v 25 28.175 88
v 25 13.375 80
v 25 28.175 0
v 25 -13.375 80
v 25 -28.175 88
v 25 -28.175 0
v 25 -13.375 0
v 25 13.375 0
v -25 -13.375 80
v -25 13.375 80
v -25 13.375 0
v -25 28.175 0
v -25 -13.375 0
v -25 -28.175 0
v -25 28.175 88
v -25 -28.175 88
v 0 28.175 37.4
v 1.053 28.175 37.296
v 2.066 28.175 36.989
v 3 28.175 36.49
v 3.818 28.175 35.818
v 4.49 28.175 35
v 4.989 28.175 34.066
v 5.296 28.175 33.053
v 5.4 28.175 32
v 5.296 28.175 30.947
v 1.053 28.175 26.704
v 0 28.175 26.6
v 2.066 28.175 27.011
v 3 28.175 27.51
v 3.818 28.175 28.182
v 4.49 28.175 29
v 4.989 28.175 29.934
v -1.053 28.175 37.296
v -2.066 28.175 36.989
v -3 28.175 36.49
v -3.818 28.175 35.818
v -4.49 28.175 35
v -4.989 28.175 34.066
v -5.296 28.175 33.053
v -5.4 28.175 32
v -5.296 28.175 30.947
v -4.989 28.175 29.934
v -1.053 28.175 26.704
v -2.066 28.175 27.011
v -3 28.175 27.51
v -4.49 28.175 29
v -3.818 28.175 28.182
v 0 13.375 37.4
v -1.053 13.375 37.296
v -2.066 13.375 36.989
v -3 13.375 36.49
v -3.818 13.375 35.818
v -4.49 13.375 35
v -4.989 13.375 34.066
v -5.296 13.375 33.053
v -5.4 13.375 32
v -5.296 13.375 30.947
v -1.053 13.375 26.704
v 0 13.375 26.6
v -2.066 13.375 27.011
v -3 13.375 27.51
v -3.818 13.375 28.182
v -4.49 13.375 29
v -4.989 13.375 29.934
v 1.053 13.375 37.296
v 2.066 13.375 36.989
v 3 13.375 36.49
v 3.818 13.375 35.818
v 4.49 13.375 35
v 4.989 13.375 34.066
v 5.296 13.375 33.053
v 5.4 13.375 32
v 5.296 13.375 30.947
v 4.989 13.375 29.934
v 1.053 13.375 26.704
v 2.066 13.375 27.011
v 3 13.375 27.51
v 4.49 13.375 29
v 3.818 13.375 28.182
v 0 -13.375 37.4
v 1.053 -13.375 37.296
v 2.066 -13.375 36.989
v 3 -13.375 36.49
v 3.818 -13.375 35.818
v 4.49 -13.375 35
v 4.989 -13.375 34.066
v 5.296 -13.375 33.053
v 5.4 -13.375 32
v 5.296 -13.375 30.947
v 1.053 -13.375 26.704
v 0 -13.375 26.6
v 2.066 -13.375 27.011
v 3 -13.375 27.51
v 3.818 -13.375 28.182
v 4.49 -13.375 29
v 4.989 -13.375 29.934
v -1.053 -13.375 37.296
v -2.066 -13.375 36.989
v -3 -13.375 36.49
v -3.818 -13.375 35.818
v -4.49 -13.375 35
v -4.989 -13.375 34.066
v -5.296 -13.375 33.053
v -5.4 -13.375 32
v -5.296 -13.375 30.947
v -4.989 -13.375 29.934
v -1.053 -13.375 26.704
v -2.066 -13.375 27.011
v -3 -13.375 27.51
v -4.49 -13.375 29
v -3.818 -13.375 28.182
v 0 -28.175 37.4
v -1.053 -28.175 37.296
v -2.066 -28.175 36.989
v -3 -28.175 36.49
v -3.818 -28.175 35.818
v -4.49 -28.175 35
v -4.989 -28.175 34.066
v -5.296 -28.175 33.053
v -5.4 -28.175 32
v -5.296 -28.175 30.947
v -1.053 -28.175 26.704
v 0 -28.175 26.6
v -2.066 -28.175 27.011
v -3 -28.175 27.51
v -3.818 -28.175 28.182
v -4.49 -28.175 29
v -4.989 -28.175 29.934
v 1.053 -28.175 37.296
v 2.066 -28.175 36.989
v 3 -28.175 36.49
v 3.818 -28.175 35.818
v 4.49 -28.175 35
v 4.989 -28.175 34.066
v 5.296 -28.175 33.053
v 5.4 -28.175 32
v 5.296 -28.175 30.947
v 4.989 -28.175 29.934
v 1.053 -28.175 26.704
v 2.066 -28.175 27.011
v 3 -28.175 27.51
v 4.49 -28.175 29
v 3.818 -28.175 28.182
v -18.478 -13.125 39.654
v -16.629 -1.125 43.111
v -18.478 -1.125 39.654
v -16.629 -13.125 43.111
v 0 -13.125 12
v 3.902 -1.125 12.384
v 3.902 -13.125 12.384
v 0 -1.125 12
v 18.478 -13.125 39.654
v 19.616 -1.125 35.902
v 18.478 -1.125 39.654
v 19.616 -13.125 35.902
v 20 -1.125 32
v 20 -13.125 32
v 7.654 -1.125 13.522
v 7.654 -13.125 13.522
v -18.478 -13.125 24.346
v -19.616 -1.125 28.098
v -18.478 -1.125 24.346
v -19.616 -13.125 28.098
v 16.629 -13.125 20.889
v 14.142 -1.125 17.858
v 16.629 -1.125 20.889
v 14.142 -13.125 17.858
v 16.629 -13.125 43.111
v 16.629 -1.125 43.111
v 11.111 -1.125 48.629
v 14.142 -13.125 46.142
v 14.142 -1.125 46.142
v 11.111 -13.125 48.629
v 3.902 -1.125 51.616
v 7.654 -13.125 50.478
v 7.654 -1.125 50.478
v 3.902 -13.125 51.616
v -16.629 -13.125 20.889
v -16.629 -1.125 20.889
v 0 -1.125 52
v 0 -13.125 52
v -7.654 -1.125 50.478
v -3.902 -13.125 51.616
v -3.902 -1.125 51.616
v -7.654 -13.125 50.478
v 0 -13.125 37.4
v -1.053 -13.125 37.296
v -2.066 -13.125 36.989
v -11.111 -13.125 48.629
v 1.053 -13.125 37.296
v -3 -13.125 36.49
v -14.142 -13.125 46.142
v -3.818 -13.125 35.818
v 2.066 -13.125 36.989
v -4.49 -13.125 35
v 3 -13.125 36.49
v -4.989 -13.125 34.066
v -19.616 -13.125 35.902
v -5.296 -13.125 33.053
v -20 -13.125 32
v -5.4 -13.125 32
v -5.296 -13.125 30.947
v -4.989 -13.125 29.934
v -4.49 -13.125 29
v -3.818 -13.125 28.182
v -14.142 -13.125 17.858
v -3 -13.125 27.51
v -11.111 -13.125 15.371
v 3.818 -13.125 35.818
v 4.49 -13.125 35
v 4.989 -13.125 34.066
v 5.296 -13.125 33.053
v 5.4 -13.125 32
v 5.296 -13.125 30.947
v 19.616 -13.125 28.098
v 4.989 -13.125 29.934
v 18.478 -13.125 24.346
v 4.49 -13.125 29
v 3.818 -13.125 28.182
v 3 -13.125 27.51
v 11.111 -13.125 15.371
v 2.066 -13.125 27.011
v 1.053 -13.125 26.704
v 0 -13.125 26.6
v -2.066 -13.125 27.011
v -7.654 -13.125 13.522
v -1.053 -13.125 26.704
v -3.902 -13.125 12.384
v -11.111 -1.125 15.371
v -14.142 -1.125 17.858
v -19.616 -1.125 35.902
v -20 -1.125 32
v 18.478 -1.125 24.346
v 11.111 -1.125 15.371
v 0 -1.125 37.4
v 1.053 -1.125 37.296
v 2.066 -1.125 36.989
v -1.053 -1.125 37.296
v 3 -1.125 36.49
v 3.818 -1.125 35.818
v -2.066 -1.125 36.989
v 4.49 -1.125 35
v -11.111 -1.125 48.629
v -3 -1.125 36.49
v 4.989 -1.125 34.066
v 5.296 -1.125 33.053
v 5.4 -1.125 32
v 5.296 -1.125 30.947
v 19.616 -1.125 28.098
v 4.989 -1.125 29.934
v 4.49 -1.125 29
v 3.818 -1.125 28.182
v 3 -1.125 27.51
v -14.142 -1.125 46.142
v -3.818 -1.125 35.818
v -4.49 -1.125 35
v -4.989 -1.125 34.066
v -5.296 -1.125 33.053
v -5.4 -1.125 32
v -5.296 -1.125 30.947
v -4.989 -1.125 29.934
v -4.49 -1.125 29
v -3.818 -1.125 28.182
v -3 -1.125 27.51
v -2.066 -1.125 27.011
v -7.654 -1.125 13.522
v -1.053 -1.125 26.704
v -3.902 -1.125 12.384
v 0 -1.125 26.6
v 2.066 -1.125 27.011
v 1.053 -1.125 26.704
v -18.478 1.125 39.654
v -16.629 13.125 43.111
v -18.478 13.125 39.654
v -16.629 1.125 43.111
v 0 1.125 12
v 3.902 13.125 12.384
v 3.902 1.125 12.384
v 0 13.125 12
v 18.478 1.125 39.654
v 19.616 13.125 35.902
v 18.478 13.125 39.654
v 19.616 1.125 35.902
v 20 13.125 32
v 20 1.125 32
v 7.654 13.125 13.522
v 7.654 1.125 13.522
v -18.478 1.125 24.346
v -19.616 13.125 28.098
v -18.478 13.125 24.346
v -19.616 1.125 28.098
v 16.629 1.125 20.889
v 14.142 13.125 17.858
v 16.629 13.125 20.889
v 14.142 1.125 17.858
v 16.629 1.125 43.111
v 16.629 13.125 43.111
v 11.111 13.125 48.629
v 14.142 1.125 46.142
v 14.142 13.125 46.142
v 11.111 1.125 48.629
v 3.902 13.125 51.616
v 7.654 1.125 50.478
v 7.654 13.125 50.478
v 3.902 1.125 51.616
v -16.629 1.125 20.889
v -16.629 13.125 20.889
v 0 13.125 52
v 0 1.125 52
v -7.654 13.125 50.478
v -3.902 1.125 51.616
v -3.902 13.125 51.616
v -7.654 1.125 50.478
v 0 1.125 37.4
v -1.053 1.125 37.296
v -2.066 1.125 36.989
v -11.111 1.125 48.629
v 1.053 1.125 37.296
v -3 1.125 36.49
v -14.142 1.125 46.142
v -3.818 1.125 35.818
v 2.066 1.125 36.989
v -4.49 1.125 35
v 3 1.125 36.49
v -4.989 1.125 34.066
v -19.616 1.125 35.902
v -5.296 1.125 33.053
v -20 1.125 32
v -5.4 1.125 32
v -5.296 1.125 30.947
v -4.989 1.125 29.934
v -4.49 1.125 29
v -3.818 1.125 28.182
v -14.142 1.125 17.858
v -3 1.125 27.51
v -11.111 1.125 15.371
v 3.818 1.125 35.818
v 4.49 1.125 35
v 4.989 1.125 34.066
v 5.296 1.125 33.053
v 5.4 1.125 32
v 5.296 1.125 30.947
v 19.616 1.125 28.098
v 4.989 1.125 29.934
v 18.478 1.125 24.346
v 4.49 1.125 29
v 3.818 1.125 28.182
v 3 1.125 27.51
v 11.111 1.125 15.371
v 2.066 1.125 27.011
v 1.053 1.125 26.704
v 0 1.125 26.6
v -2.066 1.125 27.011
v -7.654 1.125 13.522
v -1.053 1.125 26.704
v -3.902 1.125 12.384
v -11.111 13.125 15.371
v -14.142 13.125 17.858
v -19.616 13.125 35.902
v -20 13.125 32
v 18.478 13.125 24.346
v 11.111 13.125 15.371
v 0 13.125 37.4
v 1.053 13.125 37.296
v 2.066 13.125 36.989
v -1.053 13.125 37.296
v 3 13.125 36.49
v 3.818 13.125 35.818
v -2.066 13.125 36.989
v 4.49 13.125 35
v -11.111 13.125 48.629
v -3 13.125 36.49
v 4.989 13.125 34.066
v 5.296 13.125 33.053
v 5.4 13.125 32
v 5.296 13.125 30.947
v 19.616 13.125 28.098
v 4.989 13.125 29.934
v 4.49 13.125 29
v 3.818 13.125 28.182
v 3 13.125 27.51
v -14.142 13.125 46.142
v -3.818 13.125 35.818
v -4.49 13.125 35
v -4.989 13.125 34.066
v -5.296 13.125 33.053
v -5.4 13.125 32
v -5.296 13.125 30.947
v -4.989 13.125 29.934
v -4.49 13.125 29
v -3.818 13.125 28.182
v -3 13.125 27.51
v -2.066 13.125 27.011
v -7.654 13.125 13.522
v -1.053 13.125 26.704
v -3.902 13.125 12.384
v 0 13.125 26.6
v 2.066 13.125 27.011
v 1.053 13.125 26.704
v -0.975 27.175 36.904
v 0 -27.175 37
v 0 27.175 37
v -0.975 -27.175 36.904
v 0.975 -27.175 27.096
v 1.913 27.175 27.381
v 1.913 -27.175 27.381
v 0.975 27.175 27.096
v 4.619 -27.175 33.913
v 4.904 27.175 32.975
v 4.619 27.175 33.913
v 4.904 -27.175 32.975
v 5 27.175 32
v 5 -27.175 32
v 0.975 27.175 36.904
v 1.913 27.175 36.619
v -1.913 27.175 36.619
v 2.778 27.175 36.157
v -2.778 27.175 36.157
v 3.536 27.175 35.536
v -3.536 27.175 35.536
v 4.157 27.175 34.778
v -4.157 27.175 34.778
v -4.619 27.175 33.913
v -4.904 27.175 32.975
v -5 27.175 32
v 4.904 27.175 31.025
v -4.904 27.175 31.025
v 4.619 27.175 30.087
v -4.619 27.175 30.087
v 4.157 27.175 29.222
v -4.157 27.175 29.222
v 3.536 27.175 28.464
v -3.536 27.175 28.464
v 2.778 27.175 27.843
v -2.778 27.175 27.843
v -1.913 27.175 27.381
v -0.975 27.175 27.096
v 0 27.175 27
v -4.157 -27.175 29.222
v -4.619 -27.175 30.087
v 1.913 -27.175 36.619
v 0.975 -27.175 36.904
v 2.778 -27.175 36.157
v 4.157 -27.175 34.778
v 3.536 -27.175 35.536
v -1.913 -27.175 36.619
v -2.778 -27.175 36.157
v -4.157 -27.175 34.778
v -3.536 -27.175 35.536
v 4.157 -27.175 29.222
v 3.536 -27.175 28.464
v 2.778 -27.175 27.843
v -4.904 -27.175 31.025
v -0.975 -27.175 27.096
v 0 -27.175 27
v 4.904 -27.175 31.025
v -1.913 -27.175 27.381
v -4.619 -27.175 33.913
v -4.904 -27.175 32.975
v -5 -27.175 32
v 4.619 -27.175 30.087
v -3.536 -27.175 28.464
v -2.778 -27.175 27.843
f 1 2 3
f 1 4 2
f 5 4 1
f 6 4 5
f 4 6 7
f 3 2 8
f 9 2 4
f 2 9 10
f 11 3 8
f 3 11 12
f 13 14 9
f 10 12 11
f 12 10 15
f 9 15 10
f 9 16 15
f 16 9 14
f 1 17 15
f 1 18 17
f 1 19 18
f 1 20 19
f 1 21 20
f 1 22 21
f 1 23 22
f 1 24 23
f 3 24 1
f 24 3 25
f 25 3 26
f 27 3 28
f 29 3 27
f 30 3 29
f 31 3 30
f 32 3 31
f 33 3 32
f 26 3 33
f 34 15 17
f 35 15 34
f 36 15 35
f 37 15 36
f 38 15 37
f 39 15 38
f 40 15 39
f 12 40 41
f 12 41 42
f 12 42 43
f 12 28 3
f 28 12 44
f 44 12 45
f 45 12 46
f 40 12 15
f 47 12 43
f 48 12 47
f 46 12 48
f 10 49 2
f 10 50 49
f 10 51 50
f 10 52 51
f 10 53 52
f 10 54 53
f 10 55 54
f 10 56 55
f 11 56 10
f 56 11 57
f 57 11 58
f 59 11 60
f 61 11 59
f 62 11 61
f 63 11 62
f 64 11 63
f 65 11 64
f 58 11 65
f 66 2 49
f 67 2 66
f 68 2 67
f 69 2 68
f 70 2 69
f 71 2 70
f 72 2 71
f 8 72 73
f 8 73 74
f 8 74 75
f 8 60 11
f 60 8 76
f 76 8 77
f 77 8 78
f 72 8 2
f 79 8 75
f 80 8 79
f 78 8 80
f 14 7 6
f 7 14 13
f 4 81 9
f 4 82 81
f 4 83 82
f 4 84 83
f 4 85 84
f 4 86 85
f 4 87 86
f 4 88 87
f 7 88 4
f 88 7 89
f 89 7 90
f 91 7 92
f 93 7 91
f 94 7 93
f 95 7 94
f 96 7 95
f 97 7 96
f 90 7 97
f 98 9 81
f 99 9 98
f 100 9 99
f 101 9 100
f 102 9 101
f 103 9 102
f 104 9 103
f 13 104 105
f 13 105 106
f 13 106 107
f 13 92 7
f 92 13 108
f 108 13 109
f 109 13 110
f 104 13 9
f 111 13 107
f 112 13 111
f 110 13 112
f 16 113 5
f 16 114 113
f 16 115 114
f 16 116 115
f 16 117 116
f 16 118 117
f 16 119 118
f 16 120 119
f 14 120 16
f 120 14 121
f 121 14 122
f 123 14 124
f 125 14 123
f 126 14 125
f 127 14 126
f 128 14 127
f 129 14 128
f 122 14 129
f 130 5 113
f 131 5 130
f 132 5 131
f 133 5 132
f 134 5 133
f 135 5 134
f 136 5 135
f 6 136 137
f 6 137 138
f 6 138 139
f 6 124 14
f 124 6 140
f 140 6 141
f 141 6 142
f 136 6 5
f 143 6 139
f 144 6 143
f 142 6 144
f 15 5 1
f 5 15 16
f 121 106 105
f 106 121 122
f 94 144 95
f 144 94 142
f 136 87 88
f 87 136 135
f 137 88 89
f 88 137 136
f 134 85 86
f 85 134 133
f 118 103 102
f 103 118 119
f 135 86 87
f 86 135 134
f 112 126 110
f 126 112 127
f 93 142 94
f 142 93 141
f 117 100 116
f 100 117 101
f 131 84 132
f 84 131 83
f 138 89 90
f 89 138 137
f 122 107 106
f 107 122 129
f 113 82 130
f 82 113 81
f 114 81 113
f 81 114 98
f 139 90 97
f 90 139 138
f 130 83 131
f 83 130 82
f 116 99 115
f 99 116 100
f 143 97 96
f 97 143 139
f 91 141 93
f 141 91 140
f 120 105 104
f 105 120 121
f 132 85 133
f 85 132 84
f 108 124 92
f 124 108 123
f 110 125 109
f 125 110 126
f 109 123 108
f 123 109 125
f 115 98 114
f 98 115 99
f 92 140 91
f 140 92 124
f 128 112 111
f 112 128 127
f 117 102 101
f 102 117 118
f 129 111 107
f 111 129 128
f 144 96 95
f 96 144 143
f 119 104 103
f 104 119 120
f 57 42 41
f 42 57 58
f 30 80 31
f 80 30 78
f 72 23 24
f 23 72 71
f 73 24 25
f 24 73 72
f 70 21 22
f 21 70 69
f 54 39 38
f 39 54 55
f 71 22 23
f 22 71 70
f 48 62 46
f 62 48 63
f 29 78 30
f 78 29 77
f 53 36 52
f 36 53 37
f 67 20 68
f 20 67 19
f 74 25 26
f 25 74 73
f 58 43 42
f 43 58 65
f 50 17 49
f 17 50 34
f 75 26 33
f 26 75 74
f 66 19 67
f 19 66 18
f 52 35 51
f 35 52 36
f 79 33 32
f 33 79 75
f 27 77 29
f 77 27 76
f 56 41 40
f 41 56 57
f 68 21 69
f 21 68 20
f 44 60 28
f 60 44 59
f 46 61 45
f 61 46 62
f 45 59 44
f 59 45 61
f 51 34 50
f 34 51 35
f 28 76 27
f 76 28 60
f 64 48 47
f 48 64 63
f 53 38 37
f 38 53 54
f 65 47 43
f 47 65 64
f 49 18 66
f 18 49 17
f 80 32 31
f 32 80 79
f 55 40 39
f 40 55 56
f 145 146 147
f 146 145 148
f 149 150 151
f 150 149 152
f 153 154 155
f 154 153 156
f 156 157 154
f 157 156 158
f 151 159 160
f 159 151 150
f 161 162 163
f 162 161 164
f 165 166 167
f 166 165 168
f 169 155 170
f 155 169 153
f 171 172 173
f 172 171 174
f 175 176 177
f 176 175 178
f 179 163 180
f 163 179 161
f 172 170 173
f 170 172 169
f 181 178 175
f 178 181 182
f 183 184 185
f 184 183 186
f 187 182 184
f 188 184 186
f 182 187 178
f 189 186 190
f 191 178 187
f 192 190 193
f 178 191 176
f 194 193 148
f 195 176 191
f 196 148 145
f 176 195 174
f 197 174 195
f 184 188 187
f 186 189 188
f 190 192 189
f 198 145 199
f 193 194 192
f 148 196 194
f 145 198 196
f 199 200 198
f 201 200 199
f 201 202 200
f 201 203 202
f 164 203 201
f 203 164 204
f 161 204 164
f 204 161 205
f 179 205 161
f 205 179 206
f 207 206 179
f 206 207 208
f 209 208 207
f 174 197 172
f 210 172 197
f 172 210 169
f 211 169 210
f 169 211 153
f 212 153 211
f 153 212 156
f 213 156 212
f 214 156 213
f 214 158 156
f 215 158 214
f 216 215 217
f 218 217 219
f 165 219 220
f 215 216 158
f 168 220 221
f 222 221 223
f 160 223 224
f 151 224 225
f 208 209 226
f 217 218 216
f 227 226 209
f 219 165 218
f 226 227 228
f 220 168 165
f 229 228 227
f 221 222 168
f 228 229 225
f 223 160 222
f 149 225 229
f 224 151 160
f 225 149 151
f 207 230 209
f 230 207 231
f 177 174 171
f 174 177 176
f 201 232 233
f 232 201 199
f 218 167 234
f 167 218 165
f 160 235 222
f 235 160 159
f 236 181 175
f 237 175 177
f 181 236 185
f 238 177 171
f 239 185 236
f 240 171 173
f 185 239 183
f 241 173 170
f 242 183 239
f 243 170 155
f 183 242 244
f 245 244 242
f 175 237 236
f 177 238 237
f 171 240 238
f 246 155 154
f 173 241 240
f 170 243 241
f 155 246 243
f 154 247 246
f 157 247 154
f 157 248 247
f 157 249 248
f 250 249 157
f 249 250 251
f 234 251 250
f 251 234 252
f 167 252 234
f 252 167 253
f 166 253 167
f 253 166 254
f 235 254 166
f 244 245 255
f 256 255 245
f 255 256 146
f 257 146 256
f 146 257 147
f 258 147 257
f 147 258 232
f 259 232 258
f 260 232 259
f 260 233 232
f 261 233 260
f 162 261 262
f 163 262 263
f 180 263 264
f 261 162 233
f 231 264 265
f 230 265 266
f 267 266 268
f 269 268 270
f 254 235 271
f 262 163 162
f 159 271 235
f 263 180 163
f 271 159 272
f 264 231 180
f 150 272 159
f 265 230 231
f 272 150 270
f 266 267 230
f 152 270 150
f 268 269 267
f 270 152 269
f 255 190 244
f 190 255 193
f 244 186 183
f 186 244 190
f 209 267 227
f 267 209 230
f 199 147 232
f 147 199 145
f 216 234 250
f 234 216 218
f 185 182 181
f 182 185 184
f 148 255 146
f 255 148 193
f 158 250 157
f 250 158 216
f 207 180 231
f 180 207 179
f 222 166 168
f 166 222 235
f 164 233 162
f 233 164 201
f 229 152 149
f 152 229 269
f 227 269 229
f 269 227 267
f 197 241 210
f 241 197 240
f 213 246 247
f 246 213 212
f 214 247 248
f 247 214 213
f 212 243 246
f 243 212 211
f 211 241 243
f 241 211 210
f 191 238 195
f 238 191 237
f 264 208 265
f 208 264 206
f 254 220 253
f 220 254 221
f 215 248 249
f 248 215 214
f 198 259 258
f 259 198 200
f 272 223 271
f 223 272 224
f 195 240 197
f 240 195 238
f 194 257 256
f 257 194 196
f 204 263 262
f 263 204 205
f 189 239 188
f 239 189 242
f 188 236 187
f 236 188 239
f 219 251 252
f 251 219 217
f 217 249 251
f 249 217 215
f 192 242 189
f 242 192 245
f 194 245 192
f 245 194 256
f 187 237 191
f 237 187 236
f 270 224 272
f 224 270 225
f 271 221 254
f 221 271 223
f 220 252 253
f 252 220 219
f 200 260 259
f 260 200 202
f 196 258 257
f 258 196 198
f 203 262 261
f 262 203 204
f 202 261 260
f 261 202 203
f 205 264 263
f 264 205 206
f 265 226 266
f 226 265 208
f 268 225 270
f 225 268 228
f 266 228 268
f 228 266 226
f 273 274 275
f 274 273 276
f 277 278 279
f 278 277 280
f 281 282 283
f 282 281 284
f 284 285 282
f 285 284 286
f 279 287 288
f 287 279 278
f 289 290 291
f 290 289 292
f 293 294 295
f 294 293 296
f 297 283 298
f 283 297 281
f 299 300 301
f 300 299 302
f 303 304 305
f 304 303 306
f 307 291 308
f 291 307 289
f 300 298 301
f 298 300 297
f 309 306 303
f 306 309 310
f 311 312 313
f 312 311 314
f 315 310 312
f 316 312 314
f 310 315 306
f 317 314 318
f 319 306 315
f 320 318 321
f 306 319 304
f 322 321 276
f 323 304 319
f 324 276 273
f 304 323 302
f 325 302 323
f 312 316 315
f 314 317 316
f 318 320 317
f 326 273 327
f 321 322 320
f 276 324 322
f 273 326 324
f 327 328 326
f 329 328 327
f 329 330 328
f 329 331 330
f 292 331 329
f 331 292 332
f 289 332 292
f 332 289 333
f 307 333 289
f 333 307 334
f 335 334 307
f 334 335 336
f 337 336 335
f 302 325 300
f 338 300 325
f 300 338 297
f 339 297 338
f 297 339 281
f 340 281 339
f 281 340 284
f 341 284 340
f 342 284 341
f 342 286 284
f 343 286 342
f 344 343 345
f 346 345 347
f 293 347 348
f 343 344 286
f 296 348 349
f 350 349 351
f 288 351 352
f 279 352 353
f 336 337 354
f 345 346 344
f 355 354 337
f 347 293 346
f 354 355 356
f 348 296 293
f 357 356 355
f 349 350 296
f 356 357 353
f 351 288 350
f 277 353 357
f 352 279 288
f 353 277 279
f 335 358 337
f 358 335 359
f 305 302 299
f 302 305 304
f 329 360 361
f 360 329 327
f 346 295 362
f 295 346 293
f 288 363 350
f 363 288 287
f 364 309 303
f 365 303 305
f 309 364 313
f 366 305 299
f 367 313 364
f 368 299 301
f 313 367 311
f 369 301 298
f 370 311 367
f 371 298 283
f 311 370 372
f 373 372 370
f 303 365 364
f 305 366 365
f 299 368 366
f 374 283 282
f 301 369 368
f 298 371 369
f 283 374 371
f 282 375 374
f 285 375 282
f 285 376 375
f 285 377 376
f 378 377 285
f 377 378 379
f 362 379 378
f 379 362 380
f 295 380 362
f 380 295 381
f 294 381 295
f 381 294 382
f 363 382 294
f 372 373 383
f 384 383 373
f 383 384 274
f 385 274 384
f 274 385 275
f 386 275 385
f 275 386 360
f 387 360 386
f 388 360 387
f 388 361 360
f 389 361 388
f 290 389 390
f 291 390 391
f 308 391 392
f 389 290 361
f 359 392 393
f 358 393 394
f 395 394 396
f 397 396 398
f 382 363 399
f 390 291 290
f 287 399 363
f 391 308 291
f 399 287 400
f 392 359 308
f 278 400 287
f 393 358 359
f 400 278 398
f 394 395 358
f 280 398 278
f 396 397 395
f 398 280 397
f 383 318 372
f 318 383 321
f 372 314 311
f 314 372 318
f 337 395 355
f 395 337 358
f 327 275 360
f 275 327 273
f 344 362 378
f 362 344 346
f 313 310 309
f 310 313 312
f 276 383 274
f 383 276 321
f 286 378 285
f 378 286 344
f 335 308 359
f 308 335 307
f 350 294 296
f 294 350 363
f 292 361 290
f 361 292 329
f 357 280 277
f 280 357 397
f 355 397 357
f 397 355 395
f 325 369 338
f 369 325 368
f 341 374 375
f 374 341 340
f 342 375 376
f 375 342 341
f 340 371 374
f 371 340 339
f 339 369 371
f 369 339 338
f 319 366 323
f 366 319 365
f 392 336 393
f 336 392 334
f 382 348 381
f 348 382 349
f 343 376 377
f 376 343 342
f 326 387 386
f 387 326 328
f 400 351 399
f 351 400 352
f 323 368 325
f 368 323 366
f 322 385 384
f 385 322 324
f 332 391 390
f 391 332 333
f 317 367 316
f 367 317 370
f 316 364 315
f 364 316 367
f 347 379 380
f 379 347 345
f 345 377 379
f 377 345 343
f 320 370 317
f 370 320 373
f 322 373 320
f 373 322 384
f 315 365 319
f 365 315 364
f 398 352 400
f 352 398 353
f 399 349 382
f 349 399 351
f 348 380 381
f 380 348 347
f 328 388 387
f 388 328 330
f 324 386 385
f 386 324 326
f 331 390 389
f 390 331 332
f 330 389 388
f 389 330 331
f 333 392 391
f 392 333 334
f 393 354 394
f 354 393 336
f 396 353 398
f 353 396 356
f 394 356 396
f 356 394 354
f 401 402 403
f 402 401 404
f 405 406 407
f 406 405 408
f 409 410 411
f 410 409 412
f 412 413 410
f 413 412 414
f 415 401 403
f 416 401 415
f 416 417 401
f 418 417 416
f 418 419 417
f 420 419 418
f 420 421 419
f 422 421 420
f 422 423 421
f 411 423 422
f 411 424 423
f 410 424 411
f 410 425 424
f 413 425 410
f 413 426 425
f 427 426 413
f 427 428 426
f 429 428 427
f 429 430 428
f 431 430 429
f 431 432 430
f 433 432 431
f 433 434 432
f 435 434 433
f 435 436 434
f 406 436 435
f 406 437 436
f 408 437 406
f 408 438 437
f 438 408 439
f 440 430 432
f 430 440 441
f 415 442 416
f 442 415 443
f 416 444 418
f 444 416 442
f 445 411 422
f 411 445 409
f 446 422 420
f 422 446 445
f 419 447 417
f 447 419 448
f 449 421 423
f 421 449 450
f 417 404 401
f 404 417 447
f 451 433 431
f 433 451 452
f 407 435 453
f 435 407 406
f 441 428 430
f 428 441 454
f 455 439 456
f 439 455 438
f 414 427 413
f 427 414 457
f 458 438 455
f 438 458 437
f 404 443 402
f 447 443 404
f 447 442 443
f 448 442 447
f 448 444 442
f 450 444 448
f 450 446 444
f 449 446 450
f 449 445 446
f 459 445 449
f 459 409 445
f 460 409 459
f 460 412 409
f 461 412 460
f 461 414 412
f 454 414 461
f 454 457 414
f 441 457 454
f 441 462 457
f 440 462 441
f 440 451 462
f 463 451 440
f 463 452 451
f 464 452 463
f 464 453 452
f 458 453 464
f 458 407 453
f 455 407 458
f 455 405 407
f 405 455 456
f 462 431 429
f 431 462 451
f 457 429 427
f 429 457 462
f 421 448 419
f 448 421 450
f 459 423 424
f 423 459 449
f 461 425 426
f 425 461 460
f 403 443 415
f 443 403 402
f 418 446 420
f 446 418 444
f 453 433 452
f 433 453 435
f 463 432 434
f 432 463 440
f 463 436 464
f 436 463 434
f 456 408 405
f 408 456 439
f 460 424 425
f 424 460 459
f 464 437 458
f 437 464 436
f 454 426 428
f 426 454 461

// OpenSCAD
$fn = 32;

// ------------------------------------------------------------------------
// Trolley wheel set: wheels d40, fork 80 mm tall
// Every part is its own module, assembly() places every instance.
// ------------------------------------------------------------------------

// --- part 1 ---
module trolley_fork() {
  difference() {
    union() {
      translate([-25, 13.375, 0]) cube([50, 14.8, 80]);
      translate([-25, -28.175, 0]) cube([50, 14.8, 80]);
      translate([-25, -28.175, 80]) cube([50, 56.35, 8]);
    }
    translate([0, -20.775, 32]) rotate([90, 0, 0]) cylinder(h = 16.8, d = 10.8, center = true);
    translate([0, 20.775, 32]) rotate([90, 0, 0]) cylinder(h = 16.8, d = 10.8, center = true);
  }
}

// --- part 2 ---
module trolley_wheel() {
  difference() {
      translate([0, 0, 0]) cylinder(h = 12, d = 40);
      translate([0, 0, -1]) cylinder(h = 14, d = 10.8);
    }
}

// --- part 3 ---
module trolley_axle() {
  translate([0, 0, -27.175]) cylinder(h = 54.35, d = 10);
}

// --- assembly ---
module assembly() {
  color([0.80, 0.24, 0.20]) translate([0, 0, 0]) rotate([0, 0, 0]) trolley_fork();
  color([0.20, 0.45, 0.75]) translate([0, -1.125, 32]) rotate([90, 0, 0]) trolley_wheel();
  color([0.25, 0.62, 0.32]) translate([0, 13.125, 32]) rotate([90, 0, 0]) trolley_wheel();
  color([0.92, 0.70, 0.18]) translate([0, 0, 32]) rotate([90, 0, 0]) trolley_axle();
}

assembly();
